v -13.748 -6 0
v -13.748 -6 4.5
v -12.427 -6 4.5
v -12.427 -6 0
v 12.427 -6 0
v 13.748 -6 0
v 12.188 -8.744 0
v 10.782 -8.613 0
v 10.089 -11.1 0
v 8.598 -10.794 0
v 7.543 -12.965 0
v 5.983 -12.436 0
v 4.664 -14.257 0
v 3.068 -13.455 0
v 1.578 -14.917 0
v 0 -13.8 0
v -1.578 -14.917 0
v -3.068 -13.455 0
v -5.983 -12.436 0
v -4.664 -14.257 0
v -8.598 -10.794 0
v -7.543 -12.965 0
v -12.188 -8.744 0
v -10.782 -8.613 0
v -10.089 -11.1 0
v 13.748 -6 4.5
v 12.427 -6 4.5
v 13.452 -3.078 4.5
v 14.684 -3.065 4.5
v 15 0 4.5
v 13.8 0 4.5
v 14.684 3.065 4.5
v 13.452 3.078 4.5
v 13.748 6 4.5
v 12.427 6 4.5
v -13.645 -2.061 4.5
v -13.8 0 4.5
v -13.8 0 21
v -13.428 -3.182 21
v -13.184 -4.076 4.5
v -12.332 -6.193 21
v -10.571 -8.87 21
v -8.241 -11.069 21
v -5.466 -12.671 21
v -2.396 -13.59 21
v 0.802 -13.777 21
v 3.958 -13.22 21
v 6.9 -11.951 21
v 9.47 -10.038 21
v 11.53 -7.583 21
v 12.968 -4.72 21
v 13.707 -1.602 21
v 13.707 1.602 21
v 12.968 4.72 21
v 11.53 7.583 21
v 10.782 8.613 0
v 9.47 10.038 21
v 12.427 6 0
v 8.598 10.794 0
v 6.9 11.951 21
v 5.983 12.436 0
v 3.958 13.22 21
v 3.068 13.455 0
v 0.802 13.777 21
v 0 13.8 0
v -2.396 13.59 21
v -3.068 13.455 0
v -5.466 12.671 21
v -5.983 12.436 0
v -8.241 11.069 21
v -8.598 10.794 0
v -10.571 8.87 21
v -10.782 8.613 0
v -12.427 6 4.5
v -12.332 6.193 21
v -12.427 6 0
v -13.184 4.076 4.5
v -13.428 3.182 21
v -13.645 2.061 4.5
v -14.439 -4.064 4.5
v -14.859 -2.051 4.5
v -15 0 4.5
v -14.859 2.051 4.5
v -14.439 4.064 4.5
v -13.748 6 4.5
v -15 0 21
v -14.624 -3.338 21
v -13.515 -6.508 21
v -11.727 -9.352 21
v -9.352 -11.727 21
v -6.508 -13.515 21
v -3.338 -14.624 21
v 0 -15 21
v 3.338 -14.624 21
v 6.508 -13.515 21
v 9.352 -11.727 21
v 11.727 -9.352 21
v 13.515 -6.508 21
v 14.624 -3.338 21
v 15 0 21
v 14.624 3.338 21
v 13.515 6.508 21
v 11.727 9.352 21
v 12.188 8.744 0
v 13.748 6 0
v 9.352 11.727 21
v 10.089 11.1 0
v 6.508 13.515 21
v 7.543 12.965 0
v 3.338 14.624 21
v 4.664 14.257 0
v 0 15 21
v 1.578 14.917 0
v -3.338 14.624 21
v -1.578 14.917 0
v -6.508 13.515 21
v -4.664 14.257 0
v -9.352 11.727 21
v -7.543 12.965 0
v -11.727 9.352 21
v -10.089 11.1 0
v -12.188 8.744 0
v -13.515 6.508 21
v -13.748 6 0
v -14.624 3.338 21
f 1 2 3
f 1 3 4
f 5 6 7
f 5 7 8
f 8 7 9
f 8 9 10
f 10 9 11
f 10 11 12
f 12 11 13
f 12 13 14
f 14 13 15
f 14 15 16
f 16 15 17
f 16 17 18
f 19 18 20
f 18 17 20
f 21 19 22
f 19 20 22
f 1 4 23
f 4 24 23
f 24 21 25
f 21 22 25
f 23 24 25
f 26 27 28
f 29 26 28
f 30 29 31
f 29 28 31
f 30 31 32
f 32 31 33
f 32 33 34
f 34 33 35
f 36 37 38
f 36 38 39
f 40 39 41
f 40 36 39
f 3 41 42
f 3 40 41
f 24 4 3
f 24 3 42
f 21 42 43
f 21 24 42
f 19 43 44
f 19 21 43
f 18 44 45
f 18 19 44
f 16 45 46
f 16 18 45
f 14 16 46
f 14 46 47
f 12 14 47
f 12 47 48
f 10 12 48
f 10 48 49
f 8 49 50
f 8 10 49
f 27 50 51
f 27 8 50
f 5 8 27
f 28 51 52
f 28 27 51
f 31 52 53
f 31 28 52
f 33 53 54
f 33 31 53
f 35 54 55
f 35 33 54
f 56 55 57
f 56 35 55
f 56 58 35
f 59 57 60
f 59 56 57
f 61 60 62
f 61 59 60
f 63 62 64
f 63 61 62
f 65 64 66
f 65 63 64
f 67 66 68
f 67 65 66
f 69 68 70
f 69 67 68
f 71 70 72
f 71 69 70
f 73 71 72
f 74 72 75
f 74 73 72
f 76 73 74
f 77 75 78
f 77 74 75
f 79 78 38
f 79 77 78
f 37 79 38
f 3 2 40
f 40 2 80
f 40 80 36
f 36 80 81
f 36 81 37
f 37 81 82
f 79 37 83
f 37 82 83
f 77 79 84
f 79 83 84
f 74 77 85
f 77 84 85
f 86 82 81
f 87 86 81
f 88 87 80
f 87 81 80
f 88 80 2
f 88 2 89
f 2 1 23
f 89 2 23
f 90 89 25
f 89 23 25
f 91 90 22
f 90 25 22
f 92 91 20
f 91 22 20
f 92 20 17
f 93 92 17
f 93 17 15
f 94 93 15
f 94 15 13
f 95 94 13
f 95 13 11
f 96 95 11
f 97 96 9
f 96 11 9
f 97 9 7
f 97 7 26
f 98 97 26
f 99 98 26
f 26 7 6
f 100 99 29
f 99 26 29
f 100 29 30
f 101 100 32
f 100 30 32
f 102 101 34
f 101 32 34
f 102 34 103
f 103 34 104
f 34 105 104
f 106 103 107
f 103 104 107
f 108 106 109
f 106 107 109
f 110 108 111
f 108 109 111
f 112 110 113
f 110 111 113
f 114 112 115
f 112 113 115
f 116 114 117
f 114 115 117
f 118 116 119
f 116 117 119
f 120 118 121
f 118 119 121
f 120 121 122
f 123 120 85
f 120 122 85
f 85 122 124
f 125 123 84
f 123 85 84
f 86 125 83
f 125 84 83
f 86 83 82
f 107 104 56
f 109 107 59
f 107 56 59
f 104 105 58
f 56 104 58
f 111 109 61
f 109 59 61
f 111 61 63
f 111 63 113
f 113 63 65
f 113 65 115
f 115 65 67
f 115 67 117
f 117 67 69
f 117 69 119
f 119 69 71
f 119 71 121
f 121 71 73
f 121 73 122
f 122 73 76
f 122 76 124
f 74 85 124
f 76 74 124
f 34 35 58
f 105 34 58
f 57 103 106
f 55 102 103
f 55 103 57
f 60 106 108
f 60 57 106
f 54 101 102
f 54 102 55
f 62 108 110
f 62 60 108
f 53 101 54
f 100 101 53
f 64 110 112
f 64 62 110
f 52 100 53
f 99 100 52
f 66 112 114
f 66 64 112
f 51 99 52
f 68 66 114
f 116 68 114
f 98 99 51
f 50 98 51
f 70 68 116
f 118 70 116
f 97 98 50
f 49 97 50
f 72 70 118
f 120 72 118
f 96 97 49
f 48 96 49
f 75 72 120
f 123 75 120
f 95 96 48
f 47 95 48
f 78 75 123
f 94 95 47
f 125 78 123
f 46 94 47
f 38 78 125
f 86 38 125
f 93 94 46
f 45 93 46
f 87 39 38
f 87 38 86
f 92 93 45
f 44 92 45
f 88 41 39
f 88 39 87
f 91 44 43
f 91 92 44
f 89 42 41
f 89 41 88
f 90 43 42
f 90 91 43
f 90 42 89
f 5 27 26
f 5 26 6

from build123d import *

# Parameters (mm, degrees)
SKETCH_1_R               = 15
SKETCH_1_R_2             = 13.8
EXTRUDE_1_DEPTH          = 21
CUT_EXTRUDE_1_DEPTH      = 21
CUT_EXTRUDE_1_DEPTH_BACK = 21
SKETCH_2_W               = 9
SKETCH_2_H               = 12


with BuildPart() as part:
    # Эскиз1 → Бобышка-Вытянуть1 (new body)
    with BuildSketch(Plane.XY):
        Circle(SKETCH_1_R)
        Circle(SKETCH_1_R_2, mode=Mode.SUBTRACT)
    extrude(amount=EXTRUDE_1_DEPTH)

    # Эскиз2 → Вырез-Вытянуть1 (cut, two sides: drawn at the far end of the back side and taken through both)
    with BuildSketch(Plane(origin=(0, 0, 0), x_dir=(0, 0, -1), z_dir=(1, 0, 0)).offset(-CUT_EXTRUDE_1_DEPTH_BACK)):
        Rectangle(SKETCH_2_W, SKETCH_2_H)
    extrude(amount=CUT_EXTRUDE_1_DEPTH + CUT_EXTRUDE_1_DEPTH_BACK, mode=Mode.SUBTRACT)


solid = part.part
